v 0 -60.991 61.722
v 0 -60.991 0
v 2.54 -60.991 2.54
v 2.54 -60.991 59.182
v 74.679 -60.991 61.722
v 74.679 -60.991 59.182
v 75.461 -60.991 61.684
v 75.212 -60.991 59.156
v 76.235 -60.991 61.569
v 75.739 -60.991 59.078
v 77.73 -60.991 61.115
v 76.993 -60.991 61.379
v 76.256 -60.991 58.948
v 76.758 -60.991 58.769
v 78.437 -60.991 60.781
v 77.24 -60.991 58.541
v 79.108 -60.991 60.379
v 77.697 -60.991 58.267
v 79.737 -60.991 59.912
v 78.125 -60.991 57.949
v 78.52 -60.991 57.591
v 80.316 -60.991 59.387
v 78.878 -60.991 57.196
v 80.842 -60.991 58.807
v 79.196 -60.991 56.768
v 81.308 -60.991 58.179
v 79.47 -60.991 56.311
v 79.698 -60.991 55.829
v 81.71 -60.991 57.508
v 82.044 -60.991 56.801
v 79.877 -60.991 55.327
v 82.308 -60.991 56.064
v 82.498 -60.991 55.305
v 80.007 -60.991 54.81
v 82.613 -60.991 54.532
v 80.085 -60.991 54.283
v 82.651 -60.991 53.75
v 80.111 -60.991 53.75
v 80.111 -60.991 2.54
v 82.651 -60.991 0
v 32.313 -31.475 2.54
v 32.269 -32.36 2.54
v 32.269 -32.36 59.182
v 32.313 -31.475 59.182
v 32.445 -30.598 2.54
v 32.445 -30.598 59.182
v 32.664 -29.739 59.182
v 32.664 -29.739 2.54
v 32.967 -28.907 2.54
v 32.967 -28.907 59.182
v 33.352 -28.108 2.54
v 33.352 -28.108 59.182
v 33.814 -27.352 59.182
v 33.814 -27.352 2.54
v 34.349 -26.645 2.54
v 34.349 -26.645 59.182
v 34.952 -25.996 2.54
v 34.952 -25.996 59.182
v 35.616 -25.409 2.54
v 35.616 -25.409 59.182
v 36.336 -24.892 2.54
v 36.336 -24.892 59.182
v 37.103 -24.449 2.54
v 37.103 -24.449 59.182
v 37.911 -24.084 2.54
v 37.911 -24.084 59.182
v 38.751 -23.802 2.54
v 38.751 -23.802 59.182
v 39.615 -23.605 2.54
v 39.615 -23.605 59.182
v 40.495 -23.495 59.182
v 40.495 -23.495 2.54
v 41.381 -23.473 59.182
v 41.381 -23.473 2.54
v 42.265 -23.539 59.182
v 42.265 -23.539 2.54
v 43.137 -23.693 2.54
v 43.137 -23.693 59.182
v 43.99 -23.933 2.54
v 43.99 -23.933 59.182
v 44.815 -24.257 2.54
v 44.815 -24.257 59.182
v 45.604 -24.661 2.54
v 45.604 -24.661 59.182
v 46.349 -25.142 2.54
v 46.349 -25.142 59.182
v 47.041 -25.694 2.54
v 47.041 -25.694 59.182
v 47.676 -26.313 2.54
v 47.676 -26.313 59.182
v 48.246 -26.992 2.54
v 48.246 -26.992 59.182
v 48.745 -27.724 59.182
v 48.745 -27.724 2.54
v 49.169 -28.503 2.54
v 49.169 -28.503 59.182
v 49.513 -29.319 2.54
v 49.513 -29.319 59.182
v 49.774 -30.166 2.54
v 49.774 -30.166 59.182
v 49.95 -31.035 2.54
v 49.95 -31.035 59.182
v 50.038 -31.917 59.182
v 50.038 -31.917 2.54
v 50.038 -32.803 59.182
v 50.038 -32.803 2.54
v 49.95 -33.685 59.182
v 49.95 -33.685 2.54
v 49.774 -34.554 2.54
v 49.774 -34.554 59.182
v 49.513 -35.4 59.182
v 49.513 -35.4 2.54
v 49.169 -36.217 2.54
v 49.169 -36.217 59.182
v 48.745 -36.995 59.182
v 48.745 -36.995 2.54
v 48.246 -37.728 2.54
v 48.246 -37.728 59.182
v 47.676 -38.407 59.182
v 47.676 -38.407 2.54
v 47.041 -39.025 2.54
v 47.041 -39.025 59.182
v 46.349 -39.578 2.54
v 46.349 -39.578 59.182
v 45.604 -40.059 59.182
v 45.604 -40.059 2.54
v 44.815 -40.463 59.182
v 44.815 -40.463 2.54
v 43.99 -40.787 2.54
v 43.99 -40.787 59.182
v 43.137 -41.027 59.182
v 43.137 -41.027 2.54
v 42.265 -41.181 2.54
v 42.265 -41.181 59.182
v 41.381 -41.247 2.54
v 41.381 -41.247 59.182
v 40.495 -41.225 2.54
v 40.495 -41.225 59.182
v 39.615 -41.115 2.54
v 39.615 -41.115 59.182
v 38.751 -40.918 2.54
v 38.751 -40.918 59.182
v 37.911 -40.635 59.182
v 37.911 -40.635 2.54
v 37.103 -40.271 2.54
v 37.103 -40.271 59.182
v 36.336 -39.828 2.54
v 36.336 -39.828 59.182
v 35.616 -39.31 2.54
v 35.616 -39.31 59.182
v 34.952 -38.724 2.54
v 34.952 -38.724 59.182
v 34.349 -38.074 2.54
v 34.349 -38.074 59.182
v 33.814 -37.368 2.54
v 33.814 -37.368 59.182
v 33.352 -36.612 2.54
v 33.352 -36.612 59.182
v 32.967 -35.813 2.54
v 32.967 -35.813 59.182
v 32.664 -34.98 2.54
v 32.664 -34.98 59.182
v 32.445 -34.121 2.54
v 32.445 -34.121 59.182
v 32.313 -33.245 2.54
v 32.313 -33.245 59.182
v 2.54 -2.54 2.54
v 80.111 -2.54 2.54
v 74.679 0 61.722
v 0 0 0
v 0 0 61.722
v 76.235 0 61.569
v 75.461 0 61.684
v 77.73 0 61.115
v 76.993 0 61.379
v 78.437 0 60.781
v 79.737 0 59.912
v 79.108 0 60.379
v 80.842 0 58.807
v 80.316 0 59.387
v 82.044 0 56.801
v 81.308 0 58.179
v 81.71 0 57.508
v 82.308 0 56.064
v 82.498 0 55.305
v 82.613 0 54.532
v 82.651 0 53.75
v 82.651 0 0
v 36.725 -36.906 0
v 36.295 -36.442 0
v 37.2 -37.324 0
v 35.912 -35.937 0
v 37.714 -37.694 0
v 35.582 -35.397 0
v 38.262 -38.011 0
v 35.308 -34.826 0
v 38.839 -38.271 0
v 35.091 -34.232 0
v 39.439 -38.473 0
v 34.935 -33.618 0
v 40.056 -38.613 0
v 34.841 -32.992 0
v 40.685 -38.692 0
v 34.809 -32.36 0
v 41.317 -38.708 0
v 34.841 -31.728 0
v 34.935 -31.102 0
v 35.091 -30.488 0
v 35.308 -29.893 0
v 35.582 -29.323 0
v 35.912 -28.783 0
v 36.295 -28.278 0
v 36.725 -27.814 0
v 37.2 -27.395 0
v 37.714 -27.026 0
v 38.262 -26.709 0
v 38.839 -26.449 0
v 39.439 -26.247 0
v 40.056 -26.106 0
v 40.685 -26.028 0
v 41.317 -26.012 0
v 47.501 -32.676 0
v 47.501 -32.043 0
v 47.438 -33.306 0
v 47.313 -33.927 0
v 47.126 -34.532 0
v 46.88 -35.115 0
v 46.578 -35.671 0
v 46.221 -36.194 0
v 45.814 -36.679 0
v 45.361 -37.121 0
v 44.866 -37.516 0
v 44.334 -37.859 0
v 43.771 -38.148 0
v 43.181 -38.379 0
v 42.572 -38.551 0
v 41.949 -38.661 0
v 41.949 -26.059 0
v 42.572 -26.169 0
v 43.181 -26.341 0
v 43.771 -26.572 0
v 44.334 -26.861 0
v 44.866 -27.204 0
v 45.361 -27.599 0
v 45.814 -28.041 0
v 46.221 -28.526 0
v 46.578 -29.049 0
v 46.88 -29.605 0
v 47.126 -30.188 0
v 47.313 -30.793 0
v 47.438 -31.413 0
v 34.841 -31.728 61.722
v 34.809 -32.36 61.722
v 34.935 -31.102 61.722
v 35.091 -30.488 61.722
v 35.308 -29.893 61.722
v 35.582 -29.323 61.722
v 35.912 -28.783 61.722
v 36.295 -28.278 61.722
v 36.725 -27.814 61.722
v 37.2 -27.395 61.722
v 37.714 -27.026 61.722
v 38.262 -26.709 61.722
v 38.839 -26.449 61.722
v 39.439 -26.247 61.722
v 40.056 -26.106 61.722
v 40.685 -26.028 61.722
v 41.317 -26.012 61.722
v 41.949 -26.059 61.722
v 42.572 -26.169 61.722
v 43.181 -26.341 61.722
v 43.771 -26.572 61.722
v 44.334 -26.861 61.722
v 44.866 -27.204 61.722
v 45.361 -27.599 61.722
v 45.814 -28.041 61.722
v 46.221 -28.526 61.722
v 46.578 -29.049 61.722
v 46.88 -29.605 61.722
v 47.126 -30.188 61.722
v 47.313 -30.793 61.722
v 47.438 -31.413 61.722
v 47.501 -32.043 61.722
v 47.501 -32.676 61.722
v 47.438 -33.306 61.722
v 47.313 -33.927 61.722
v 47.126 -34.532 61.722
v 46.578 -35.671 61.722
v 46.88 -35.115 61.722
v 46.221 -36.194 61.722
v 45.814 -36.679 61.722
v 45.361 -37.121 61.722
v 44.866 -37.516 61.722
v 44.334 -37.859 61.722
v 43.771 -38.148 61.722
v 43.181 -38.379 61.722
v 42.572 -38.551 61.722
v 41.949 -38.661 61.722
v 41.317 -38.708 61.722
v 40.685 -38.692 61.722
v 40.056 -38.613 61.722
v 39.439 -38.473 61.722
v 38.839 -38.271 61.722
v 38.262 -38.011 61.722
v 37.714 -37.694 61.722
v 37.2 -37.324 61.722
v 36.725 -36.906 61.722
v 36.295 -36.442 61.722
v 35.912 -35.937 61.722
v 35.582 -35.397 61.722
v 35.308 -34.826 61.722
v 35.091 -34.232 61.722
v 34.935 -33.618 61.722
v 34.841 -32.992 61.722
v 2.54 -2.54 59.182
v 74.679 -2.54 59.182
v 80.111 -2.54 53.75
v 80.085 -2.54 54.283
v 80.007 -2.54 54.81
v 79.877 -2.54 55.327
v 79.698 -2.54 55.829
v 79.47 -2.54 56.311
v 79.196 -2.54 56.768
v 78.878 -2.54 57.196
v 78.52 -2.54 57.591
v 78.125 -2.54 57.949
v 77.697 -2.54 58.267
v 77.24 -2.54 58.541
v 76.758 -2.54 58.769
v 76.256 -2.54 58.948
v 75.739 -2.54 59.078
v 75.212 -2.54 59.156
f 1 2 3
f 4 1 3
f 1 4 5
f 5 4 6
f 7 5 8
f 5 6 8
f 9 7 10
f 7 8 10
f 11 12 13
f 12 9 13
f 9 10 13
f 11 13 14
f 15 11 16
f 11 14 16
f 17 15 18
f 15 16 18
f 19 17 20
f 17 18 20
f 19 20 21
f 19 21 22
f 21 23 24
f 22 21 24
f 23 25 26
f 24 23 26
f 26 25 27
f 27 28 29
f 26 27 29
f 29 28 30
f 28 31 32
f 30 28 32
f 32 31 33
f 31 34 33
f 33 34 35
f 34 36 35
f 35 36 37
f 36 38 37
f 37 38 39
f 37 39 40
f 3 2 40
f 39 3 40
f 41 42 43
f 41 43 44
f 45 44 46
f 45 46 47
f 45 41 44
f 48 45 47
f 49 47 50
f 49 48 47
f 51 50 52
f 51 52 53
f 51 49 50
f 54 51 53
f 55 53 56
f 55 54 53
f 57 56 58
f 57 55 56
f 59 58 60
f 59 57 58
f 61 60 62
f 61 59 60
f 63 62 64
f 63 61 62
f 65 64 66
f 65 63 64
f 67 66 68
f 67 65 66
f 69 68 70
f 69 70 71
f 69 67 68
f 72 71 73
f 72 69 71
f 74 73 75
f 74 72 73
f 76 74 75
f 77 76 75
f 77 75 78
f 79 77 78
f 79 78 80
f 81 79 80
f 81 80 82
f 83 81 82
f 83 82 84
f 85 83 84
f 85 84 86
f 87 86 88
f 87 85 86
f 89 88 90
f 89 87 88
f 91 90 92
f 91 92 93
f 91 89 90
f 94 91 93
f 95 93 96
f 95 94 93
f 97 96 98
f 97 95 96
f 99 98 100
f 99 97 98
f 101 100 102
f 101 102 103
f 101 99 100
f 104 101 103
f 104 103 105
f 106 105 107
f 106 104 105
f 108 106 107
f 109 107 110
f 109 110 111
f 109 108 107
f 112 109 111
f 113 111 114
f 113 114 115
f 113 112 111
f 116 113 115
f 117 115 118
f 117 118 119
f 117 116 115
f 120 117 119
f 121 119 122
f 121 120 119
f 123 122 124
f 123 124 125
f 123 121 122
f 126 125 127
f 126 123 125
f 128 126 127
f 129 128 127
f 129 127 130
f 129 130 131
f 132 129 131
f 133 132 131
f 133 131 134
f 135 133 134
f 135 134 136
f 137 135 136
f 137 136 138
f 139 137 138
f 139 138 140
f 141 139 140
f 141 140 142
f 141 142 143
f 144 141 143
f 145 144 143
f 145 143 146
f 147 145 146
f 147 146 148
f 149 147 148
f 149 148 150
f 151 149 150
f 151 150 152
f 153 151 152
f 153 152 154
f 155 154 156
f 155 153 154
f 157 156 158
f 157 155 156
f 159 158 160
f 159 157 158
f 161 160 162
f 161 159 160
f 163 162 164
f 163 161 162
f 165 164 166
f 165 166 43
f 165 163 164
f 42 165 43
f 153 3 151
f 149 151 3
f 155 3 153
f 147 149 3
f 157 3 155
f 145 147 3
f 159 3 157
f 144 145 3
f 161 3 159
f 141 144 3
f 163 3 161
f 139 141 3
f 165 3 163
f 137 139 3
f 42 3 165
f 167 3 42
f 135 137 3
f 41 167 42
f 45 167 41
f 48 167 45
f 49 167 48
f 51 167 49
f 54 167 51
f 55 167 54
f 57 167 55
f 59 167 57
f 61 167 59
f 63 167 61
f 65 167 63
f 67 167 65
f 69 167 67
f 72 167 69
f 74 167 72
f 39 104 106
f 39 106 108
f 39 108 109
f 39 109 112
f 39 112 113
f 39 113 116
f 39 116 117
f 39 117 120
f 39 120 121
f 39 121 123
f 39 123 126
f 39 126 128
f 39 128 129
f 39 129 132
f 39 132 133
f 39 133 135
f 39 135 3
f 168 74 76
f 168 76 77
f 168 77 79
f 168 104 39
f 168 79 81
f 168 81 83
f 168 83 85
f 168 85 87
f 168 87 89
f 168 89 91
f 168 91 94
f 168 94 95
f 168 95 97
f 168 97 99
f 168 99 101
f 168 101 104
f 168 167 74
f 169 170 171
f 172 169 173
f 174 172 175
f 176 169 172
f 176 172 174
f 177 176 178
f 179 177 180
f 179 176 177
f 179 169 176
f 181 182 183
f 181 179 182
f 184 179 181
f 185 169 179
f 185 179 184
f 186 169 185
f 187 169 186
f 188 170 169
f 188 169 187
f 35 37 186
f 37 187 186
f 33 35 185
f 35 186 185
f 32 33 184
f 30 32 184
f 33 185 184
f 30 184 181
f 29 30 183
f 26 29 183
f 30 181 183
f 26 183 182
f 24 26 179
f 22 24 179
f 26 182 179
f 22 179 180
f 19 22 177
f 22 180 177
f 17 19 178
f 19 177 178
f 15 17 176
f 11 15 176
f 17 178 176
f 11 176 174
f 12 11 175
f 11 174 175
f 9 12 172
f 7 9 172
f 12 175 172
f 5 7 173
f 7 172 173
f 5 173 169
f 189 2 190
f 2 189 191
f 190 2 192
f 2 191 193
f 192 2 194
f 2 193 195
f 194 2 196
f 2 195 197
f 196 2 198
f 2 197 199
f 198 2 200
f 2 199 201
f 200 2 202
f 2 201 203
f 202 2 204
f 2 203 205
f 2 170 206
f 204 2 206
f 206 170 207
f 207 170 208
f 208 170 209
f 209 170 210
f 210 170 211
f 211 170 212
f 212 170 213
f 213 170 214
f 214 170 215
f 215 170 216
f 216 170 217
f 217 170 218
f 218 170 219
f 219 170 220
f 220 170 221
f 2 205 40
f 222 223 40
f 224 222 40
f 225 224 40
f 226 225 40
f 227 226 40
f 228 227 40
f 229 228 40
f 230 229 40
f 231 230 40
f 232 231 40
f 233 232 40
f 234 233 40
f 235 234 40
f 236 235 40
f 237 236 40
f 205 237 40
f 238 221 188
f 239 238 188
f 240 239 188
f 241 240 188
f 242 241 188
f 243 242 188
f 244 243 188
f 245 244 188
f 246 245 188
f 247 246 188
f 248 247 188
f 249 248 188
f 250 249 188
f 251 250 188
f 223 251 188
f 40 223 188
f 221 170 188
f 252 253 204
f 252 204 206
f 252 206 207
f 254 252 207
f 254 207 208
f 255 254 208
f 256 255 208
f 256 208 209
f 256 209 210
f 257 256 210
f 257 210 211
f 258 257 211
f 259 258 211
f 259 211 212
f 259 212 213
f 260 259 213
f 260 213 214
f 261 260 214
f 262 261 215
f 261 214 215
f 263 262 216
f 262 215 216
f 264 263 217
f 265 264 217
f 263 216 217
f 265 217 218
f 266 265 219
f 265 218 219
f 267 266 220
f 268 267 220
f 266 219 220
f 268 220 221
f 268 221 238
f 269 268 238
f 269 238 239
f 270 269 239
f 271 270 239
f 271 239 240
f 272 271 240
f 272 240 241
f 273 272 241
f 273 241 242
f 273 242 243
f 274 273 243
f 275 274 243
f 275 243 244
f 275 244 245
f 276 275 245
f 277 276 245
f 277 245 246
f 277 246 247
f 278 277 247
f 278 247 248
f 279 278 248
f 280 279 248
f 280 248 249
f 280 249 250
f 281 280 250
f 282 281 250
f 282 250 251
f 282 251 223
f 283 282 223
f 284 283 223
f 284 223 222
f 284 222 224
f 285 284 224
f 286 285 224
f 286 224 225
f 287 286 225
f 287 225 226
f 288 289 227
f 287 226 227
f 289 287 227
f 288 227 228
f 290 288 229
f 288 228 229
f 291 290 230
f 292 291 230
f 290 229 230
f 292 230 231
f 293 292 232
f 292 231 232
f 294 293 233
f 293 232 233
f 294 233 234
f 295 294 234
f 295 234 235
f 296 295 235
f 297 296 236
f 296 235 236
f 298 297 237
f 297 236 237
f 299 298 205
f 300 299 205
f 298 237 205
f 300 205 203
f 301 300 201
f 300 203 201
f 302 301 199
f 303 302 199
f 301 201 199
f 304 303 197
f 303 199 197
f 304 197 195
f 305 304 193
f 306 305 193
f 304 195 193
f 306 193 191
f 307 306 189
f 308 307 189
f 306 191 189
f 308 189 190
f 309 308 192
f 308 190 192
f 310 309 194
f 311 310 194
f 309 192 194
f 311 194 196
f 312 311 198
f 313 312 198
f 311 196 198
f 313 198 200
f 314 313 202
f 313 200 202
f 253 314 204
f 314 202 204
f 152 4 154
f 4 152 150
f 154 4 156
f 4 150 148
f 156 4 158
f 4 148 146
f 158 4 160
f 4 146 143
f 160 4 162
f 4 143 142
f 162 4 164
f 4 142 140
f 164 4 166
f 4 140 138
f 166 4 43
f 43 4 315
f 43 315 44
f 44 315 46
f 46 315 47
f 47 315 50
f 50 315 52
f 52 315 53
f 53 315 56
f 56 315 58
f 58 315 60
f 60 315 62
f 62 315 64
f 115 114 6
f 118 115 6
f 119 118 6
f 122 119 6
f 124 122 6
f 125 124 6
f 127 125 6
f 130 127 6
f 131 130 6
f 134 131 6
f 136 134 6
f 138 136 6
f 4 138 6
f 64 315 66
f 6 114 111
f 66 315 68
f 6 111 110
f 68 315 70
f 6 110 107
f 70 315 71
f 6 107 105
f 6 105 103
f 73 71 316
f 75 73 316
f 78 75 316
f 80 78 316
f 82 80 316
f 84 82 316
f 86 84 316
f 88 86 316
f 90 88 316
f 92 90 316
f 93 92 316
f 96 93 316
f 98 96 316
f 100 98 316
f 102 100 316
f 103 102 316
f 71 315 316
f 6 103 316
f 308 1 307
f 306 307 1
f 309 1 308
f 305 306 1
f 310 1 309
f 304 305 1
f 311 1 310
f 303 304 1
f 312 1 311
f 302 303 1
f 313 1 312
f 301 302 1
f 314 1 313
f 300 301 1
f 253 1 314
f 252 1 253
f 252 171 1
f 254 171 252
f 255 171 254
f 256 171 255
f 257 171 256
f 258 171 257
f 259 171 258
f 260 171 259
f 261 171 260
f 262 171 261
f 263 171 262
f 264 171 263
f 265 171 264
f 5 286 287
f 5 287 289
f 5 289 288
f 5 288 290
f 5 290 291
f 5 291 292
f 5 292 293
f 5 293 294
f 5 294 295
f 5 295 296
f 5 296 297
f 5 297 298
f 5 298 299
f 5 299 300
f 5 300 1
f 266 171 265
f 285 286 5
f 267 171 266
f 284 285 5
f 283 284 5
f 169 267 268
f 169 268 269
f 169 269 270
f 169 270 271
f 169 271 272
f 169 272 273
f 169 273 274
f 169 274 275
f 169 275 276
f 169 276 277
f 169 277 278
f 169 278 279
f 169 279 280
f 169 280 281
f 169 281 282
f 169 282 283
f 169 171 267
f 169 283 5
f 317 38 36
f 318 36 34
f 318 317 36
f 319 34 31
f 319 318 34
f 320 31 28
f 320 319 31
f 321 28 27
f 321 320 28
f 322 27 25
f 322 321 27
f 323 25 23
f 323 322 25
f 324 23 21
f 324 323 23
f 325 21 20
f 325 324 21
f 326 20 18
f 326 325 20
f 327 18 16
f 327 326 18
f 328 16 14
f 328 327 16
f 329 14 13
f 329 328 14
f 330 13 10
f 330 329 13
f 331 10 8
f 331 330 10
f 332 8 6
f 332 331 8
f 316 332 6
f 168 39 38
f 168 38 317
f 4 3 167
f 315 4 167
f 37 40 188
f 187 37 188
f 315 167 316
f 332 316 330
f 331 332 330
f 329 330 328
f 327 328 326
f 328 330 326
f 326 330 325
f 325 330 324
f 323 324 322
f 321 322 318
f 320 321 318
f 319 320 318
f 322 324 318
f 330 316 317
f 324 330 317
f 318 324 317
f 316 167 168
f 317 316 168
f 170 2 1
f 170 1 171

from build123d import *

# Parameters (mm, degrees)
F0_W     = 82.651131
F0_H     = 60.990963
F1_DEPTH = 61.722
F2_R     = 7.971733
F4_D     = 12.7
F5_T     = -2.54


with BuildPart() as f1:
    # F0 (on Top) → F1 (new body)
    with BuildSketch(Plane.XY):
        with Locations((41.325565, -30.495482)):
            Rectangle(F0_W, F0_H)
    extrude(amount=F1_DEPTH)

    # F2
    f2_edges = [f1.edges().sort_by_distance(p)[0] for p in [
        (82.651131, -30.495482, 61.722),
    ]]
    fillet(f2_edges, radius=F2_R)

    # F4 (through all)
    with Locations(Plane.XY.offset(61.722)):
        with Locations((41.159108, -32.359846)):
            Hole(F4_D / 2)

    # F5
    f5_openings = [f1.faces().sort_by_distance(p)[0] for p in [
        (41.219566, -60.990963, 30.783051),
    ]]
    offset(amount=F5_T, openings=f5_openings)


solid = f1.part
